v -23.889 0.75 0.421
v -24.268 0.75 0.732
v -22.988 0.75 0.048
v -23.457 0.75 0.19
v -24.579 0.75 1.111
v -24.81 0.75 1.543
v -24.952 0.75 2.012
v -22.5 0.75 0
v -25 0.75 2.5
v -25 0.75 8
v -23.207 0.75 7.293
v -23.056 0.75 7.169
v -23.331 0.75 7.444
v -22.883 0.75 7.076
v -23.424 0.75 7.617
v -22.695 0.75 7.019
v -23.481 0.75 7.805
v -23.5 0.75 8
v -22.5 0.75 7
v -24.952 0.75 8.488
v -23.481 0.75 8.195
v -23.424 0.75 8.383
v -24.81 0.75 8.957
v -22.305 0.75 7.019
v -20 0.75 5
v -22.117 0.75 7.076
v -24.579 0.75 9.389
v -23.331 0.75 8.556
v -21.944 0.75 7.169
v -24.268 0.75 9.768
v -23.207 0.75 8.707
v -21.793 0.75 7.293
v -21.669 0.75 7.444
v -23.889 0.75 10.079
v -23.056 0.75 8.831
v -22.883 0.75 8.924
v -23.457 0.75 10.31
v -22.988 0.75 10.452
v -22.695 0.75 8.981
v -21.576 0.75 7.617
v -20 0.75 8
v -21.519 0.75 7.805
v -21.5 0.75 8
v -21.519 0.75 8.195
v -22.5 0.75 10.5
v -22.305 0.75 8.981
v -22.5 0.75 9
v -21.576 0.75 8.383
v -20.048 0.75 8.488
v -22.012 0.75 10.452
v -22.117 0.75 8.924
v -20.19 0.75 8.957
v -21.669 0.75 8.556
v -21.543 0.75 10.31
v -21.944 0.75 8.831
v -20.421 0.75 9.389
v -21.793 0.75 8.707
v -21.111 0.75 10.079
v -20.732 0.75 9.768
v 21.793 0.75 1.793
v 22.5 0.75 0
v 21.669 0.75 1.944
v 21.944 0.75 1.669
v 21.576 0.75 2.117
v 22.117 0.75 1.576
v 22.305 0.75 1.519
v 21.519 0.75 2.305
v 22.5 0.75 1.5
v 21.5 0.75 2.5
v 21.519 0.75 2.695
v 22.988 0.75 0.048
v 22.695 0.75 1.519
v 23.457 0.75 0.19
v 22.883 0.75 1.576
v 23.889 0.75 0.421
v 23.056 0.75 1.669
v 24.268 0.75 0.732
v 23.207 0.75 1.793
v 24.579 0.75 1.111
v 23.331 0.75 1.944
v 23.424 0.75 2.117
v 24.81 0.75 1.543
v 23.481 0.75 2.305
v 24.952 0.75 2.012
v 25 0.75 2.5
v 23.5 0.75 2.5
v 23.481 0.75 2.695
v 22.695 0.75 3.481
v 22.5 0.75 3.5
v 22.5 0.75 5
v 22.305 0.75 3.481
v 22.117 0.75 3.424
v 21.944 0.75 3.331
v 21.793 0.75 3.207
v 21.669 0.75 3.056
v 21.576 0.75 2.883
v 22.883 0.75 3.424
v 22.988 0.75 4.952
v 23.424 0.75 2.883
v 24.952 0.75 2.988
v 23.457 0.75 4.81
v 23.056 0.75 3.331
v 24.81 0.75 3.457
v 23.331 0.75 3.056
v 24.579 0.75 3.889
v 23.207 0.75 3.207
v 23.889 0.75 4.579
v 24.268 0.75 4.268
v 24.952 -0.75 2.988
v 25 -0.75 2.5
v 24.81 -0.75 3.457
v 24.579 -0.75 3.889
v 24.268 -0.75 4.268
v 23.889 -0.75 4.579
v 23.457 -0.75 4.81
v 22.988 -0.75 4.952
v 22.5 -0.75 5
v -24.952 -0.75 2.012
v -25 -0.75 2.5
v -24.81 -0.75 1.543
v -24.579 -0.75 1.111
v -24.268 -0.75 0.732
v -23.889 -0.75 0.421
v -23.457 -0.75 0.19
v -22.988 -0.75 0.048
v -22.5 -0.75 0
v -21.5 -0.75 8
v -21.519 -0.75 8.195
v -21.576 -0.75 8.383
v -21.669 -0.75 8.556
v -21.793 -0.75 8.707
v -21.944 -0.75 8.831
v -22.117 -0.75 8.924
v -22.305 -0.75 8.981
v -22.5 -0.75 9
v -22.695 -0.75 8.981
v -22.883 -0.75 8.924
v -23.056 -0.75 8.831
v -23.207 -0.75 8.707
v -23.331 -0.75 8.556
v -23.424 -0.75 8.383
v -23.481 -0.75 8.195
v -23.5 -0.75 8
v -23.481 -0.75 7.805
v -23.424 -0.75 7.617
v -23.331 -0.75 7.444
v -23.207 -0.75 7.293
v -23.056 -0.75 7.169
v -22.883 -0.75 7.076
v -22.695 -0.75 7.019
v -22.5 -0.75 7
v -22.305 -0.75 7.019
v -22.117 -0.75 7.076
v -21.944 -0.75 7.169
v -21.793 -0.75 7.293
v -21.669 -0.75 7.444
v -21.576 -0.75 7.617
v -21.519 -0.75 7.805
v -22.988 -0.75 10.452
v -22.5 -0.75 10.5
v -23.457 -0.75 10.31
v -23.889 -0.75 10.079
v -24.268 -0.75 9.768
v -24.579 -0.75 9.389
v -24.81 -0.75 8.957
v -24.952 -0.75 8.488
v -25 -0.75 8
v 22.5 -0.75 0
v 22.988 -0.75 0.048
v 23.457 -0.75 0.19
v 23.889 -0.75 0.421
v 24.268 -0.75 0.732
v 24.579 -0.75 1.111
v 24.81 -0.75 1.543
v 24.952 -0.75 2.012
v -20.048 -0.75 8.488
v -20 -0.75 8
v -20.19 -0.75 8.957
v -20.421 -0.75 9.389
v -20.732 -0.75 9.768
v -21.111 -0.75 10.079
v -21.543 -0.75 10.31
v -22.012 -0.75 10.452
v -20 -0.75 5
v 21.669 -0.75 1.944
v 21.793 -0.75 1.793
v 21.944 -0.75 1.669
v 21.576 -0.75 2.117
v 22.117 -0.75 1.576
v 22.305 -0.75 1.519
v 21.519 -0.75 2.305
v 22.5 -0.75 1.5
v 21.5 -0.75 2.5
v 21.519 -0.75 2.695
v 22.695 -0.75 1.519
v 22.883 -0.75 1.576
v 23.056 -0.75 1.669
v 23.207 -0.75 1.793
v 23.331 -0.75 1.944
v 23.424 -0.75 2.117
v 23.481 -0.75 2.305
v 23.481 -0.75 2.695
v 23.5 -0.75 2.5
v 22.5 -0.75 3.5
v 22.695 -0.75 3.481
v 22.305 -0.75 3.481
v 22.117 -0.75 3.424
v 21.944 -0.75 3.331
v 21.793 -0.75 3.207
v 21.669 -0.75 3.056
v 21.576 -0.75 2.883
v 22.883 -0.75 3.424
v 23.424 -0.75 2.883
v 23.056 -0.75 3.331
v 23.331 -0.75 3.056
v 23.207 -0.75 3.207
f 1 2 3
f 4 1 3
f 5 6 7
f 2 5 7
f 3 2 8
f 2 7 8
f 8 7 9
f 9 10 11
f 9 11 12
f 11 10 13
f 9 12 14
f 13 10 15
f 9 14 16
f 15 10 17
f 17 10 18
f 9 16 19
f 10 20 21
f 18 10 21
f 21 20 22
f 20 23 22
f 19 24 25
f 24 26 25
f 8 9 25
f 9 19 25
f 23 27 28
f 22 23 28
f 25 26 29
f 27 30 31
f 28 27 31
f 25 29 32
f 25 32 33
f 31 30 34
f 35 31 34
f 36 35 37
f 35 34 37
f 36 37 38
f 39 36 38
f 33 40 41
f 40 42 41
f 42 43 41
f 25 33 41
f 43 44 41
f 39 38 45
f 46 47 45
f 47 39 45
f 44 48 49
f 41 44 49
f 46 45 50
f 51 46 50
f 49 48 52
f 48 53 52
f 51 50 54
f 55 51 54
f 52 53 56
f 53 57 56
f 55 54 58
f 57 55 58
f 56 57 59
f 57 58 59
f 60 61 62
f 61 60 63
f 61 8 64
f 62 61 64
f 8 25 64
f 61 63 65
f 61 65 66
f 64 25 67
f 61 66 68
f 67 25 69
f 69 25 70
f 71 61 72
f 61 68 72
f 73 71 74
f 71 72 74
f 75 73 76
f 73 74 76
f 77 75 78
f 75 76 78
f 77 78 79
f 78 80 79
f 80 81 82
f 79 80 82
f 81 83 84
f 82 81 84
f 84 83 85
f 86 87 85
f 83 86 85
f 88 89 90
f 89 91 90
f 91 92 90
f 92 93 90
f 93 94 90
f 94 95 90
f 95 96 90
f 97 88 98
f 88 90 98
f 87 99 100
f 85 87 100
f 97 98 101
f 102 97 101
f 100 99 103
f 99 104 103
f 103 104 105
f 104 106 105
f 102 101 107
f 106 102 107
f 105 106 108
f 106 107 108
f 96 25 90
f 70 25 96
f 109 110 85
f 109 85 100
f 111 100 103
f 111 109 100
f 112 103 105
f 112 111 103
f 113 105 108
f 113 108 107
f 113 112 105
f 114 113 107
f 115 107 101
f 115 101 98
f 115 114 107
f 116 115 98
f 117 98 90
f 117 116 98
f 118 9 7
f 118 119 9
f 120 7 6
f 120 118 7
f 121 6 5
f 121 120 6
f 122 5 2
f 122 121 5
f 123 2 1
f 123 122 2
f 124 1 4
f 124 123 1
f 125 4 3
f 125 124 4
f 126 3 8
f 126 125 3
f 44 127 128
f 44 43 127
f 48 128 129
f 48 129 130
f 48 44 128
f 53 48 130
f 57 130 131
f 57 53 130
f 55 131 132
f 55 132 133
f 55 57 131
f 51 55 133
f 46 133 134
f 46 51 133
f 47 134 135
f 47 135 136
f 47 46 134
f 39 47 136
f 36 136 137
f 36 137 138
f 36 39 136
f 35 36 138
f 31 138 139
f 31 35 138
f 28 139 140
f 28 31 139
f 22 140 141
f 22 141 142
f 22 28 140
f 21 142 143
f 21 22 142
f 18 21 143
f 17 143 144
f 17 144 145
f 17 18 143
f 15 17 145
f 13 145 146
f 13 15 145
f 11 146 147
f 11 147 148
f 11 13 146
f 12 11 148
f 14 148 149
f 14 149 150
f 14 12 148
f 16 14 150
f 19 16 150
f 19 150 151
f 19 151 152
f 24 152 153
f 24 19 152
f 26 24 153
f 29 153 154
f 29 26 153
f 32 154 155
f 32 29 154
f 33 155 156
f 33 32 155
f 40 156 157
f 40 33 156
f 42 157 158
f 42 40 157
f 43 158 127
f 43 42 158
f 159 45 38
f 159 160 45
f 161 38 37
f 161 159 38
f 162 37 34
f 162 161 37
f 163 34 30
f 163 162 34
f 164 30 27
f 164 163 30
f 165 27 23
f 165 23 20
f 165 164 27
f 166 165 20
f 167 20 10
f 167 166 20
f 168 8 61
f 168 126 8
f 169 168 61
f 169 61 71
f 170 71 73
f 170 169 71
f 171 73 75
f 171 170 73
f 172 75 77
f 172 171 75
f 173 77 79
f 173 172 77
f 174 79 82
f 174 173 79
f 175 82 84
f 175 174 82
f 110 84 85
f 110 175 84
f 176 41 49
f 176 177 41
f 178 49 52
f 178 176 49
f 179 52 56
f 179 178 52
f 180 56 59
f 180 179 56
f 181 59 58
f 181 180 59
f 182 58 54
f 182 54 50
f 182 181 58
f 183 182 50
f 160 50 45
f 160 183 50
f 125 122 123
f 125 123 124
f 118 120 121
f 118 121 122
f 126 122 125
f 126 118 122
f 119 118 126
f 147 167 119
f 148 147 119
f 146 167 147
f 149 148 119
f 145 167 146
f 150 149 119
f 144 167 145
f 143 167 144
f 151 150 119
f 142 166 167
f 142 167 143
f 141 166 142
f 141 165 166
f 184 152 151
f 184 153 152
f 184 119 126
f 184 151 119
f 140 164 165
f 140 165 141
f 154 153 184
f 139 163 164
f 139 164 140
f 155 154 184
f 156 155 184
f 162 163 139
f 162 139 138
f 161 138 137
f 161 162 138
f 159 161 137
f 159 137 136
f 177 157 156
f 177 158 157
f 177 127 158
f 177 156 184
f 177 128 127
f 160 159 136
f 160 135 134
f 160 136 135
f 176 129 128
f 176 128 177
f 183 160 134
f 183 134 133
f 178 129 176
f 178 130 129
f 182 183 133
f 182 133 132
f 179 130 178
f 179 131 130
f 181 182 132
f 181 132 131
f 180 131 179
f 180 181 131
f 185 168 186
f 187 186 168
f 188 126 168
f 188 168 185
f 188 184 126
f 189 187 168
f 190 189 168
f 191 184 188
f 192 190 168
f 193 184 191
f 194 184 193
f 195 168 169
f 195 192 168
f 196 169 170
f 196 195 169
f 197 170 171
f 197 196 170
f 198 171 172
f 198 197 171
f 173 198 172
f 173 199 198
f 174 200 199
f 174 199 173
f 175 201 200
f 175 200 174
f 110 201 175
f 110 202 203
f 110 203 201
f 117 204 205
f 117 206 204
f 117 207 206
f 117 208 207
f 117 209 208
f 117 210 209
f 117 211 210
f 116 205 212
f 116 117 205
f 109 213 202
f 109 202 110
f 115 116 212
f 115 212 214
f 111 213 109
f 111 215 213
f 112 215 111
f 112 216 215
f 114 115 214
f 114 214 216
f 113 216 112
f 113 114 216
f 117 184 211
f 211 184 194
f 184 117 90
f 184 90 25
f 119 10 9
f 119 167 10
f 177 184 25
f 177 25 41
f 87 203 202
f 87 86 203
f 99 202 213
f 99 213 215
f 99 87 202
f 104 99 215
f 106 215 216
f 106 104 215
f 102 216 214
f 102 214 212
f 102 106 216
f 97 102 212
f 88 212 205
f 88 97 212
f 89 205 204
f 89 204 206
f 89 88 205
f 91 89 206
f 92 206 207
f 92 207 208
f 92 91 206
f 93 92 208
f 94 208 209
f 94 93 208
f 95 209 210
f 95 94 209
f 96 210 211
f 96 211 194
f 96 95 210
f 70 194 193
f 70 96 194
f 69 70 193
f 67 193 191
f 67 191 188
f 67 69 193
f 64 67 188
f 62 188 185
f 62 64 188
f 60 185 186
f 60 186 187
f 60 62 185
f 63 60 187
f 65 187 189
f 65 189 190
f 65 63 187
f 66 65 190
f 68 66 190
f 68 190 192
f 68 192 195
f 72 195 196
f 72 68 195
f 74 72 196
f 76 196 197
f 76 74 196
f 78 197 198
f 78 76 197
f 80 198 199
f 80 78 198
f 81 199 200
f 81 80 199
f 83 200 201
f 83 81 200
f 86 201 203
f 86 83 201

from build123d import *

# Parameters (mm, degrees)
F0_R     = 1
F1_DEPTH = 0.75


with BuildPart() as f1:
    # F0 (on Front) → F1 (new body, symmetric)
    with BuildSketch(Plane.XZ):
        with BuildLine():
            Line((-22.5, 0), (0, 0))
            Line((0, 0), (22.5, 0))
            ThreePointArc((22.5, 0), (24.267767, 0.732233), (25, 2.5))
            ThreePointArc((25, 2.5), (24.267767, 4.267767), (22.5, 5))
            Line((22.5, 5), (0, 5))
            Line((0, 5), (-20, 5))
            Line((-20, 5), (-20, 8))
            ThreePointArc((-20, 8), (-20.732233, 9.767767), (-22.5, 10.5))
            ThreePointArc((-22.5, 10.5), (-24.267767, 9.767767), (-25, 8))
            Line((-25, 8), (-25, 2.5))
            ThreePointArc((-25, 2.5), (-24.267767, 0.732233), (-22.5, 0))
        make_face()
        with Locations((22.5, 2.5)):
            Circle(F0_R, mode=Mode.SUBTRACT)
        with Locations((-22.5, 8)):
            Circle(F0_R, mode=Mode.SUBTRACT)
    extrude(amount=F1_DEPTH, both=True)


solid = f1.part
